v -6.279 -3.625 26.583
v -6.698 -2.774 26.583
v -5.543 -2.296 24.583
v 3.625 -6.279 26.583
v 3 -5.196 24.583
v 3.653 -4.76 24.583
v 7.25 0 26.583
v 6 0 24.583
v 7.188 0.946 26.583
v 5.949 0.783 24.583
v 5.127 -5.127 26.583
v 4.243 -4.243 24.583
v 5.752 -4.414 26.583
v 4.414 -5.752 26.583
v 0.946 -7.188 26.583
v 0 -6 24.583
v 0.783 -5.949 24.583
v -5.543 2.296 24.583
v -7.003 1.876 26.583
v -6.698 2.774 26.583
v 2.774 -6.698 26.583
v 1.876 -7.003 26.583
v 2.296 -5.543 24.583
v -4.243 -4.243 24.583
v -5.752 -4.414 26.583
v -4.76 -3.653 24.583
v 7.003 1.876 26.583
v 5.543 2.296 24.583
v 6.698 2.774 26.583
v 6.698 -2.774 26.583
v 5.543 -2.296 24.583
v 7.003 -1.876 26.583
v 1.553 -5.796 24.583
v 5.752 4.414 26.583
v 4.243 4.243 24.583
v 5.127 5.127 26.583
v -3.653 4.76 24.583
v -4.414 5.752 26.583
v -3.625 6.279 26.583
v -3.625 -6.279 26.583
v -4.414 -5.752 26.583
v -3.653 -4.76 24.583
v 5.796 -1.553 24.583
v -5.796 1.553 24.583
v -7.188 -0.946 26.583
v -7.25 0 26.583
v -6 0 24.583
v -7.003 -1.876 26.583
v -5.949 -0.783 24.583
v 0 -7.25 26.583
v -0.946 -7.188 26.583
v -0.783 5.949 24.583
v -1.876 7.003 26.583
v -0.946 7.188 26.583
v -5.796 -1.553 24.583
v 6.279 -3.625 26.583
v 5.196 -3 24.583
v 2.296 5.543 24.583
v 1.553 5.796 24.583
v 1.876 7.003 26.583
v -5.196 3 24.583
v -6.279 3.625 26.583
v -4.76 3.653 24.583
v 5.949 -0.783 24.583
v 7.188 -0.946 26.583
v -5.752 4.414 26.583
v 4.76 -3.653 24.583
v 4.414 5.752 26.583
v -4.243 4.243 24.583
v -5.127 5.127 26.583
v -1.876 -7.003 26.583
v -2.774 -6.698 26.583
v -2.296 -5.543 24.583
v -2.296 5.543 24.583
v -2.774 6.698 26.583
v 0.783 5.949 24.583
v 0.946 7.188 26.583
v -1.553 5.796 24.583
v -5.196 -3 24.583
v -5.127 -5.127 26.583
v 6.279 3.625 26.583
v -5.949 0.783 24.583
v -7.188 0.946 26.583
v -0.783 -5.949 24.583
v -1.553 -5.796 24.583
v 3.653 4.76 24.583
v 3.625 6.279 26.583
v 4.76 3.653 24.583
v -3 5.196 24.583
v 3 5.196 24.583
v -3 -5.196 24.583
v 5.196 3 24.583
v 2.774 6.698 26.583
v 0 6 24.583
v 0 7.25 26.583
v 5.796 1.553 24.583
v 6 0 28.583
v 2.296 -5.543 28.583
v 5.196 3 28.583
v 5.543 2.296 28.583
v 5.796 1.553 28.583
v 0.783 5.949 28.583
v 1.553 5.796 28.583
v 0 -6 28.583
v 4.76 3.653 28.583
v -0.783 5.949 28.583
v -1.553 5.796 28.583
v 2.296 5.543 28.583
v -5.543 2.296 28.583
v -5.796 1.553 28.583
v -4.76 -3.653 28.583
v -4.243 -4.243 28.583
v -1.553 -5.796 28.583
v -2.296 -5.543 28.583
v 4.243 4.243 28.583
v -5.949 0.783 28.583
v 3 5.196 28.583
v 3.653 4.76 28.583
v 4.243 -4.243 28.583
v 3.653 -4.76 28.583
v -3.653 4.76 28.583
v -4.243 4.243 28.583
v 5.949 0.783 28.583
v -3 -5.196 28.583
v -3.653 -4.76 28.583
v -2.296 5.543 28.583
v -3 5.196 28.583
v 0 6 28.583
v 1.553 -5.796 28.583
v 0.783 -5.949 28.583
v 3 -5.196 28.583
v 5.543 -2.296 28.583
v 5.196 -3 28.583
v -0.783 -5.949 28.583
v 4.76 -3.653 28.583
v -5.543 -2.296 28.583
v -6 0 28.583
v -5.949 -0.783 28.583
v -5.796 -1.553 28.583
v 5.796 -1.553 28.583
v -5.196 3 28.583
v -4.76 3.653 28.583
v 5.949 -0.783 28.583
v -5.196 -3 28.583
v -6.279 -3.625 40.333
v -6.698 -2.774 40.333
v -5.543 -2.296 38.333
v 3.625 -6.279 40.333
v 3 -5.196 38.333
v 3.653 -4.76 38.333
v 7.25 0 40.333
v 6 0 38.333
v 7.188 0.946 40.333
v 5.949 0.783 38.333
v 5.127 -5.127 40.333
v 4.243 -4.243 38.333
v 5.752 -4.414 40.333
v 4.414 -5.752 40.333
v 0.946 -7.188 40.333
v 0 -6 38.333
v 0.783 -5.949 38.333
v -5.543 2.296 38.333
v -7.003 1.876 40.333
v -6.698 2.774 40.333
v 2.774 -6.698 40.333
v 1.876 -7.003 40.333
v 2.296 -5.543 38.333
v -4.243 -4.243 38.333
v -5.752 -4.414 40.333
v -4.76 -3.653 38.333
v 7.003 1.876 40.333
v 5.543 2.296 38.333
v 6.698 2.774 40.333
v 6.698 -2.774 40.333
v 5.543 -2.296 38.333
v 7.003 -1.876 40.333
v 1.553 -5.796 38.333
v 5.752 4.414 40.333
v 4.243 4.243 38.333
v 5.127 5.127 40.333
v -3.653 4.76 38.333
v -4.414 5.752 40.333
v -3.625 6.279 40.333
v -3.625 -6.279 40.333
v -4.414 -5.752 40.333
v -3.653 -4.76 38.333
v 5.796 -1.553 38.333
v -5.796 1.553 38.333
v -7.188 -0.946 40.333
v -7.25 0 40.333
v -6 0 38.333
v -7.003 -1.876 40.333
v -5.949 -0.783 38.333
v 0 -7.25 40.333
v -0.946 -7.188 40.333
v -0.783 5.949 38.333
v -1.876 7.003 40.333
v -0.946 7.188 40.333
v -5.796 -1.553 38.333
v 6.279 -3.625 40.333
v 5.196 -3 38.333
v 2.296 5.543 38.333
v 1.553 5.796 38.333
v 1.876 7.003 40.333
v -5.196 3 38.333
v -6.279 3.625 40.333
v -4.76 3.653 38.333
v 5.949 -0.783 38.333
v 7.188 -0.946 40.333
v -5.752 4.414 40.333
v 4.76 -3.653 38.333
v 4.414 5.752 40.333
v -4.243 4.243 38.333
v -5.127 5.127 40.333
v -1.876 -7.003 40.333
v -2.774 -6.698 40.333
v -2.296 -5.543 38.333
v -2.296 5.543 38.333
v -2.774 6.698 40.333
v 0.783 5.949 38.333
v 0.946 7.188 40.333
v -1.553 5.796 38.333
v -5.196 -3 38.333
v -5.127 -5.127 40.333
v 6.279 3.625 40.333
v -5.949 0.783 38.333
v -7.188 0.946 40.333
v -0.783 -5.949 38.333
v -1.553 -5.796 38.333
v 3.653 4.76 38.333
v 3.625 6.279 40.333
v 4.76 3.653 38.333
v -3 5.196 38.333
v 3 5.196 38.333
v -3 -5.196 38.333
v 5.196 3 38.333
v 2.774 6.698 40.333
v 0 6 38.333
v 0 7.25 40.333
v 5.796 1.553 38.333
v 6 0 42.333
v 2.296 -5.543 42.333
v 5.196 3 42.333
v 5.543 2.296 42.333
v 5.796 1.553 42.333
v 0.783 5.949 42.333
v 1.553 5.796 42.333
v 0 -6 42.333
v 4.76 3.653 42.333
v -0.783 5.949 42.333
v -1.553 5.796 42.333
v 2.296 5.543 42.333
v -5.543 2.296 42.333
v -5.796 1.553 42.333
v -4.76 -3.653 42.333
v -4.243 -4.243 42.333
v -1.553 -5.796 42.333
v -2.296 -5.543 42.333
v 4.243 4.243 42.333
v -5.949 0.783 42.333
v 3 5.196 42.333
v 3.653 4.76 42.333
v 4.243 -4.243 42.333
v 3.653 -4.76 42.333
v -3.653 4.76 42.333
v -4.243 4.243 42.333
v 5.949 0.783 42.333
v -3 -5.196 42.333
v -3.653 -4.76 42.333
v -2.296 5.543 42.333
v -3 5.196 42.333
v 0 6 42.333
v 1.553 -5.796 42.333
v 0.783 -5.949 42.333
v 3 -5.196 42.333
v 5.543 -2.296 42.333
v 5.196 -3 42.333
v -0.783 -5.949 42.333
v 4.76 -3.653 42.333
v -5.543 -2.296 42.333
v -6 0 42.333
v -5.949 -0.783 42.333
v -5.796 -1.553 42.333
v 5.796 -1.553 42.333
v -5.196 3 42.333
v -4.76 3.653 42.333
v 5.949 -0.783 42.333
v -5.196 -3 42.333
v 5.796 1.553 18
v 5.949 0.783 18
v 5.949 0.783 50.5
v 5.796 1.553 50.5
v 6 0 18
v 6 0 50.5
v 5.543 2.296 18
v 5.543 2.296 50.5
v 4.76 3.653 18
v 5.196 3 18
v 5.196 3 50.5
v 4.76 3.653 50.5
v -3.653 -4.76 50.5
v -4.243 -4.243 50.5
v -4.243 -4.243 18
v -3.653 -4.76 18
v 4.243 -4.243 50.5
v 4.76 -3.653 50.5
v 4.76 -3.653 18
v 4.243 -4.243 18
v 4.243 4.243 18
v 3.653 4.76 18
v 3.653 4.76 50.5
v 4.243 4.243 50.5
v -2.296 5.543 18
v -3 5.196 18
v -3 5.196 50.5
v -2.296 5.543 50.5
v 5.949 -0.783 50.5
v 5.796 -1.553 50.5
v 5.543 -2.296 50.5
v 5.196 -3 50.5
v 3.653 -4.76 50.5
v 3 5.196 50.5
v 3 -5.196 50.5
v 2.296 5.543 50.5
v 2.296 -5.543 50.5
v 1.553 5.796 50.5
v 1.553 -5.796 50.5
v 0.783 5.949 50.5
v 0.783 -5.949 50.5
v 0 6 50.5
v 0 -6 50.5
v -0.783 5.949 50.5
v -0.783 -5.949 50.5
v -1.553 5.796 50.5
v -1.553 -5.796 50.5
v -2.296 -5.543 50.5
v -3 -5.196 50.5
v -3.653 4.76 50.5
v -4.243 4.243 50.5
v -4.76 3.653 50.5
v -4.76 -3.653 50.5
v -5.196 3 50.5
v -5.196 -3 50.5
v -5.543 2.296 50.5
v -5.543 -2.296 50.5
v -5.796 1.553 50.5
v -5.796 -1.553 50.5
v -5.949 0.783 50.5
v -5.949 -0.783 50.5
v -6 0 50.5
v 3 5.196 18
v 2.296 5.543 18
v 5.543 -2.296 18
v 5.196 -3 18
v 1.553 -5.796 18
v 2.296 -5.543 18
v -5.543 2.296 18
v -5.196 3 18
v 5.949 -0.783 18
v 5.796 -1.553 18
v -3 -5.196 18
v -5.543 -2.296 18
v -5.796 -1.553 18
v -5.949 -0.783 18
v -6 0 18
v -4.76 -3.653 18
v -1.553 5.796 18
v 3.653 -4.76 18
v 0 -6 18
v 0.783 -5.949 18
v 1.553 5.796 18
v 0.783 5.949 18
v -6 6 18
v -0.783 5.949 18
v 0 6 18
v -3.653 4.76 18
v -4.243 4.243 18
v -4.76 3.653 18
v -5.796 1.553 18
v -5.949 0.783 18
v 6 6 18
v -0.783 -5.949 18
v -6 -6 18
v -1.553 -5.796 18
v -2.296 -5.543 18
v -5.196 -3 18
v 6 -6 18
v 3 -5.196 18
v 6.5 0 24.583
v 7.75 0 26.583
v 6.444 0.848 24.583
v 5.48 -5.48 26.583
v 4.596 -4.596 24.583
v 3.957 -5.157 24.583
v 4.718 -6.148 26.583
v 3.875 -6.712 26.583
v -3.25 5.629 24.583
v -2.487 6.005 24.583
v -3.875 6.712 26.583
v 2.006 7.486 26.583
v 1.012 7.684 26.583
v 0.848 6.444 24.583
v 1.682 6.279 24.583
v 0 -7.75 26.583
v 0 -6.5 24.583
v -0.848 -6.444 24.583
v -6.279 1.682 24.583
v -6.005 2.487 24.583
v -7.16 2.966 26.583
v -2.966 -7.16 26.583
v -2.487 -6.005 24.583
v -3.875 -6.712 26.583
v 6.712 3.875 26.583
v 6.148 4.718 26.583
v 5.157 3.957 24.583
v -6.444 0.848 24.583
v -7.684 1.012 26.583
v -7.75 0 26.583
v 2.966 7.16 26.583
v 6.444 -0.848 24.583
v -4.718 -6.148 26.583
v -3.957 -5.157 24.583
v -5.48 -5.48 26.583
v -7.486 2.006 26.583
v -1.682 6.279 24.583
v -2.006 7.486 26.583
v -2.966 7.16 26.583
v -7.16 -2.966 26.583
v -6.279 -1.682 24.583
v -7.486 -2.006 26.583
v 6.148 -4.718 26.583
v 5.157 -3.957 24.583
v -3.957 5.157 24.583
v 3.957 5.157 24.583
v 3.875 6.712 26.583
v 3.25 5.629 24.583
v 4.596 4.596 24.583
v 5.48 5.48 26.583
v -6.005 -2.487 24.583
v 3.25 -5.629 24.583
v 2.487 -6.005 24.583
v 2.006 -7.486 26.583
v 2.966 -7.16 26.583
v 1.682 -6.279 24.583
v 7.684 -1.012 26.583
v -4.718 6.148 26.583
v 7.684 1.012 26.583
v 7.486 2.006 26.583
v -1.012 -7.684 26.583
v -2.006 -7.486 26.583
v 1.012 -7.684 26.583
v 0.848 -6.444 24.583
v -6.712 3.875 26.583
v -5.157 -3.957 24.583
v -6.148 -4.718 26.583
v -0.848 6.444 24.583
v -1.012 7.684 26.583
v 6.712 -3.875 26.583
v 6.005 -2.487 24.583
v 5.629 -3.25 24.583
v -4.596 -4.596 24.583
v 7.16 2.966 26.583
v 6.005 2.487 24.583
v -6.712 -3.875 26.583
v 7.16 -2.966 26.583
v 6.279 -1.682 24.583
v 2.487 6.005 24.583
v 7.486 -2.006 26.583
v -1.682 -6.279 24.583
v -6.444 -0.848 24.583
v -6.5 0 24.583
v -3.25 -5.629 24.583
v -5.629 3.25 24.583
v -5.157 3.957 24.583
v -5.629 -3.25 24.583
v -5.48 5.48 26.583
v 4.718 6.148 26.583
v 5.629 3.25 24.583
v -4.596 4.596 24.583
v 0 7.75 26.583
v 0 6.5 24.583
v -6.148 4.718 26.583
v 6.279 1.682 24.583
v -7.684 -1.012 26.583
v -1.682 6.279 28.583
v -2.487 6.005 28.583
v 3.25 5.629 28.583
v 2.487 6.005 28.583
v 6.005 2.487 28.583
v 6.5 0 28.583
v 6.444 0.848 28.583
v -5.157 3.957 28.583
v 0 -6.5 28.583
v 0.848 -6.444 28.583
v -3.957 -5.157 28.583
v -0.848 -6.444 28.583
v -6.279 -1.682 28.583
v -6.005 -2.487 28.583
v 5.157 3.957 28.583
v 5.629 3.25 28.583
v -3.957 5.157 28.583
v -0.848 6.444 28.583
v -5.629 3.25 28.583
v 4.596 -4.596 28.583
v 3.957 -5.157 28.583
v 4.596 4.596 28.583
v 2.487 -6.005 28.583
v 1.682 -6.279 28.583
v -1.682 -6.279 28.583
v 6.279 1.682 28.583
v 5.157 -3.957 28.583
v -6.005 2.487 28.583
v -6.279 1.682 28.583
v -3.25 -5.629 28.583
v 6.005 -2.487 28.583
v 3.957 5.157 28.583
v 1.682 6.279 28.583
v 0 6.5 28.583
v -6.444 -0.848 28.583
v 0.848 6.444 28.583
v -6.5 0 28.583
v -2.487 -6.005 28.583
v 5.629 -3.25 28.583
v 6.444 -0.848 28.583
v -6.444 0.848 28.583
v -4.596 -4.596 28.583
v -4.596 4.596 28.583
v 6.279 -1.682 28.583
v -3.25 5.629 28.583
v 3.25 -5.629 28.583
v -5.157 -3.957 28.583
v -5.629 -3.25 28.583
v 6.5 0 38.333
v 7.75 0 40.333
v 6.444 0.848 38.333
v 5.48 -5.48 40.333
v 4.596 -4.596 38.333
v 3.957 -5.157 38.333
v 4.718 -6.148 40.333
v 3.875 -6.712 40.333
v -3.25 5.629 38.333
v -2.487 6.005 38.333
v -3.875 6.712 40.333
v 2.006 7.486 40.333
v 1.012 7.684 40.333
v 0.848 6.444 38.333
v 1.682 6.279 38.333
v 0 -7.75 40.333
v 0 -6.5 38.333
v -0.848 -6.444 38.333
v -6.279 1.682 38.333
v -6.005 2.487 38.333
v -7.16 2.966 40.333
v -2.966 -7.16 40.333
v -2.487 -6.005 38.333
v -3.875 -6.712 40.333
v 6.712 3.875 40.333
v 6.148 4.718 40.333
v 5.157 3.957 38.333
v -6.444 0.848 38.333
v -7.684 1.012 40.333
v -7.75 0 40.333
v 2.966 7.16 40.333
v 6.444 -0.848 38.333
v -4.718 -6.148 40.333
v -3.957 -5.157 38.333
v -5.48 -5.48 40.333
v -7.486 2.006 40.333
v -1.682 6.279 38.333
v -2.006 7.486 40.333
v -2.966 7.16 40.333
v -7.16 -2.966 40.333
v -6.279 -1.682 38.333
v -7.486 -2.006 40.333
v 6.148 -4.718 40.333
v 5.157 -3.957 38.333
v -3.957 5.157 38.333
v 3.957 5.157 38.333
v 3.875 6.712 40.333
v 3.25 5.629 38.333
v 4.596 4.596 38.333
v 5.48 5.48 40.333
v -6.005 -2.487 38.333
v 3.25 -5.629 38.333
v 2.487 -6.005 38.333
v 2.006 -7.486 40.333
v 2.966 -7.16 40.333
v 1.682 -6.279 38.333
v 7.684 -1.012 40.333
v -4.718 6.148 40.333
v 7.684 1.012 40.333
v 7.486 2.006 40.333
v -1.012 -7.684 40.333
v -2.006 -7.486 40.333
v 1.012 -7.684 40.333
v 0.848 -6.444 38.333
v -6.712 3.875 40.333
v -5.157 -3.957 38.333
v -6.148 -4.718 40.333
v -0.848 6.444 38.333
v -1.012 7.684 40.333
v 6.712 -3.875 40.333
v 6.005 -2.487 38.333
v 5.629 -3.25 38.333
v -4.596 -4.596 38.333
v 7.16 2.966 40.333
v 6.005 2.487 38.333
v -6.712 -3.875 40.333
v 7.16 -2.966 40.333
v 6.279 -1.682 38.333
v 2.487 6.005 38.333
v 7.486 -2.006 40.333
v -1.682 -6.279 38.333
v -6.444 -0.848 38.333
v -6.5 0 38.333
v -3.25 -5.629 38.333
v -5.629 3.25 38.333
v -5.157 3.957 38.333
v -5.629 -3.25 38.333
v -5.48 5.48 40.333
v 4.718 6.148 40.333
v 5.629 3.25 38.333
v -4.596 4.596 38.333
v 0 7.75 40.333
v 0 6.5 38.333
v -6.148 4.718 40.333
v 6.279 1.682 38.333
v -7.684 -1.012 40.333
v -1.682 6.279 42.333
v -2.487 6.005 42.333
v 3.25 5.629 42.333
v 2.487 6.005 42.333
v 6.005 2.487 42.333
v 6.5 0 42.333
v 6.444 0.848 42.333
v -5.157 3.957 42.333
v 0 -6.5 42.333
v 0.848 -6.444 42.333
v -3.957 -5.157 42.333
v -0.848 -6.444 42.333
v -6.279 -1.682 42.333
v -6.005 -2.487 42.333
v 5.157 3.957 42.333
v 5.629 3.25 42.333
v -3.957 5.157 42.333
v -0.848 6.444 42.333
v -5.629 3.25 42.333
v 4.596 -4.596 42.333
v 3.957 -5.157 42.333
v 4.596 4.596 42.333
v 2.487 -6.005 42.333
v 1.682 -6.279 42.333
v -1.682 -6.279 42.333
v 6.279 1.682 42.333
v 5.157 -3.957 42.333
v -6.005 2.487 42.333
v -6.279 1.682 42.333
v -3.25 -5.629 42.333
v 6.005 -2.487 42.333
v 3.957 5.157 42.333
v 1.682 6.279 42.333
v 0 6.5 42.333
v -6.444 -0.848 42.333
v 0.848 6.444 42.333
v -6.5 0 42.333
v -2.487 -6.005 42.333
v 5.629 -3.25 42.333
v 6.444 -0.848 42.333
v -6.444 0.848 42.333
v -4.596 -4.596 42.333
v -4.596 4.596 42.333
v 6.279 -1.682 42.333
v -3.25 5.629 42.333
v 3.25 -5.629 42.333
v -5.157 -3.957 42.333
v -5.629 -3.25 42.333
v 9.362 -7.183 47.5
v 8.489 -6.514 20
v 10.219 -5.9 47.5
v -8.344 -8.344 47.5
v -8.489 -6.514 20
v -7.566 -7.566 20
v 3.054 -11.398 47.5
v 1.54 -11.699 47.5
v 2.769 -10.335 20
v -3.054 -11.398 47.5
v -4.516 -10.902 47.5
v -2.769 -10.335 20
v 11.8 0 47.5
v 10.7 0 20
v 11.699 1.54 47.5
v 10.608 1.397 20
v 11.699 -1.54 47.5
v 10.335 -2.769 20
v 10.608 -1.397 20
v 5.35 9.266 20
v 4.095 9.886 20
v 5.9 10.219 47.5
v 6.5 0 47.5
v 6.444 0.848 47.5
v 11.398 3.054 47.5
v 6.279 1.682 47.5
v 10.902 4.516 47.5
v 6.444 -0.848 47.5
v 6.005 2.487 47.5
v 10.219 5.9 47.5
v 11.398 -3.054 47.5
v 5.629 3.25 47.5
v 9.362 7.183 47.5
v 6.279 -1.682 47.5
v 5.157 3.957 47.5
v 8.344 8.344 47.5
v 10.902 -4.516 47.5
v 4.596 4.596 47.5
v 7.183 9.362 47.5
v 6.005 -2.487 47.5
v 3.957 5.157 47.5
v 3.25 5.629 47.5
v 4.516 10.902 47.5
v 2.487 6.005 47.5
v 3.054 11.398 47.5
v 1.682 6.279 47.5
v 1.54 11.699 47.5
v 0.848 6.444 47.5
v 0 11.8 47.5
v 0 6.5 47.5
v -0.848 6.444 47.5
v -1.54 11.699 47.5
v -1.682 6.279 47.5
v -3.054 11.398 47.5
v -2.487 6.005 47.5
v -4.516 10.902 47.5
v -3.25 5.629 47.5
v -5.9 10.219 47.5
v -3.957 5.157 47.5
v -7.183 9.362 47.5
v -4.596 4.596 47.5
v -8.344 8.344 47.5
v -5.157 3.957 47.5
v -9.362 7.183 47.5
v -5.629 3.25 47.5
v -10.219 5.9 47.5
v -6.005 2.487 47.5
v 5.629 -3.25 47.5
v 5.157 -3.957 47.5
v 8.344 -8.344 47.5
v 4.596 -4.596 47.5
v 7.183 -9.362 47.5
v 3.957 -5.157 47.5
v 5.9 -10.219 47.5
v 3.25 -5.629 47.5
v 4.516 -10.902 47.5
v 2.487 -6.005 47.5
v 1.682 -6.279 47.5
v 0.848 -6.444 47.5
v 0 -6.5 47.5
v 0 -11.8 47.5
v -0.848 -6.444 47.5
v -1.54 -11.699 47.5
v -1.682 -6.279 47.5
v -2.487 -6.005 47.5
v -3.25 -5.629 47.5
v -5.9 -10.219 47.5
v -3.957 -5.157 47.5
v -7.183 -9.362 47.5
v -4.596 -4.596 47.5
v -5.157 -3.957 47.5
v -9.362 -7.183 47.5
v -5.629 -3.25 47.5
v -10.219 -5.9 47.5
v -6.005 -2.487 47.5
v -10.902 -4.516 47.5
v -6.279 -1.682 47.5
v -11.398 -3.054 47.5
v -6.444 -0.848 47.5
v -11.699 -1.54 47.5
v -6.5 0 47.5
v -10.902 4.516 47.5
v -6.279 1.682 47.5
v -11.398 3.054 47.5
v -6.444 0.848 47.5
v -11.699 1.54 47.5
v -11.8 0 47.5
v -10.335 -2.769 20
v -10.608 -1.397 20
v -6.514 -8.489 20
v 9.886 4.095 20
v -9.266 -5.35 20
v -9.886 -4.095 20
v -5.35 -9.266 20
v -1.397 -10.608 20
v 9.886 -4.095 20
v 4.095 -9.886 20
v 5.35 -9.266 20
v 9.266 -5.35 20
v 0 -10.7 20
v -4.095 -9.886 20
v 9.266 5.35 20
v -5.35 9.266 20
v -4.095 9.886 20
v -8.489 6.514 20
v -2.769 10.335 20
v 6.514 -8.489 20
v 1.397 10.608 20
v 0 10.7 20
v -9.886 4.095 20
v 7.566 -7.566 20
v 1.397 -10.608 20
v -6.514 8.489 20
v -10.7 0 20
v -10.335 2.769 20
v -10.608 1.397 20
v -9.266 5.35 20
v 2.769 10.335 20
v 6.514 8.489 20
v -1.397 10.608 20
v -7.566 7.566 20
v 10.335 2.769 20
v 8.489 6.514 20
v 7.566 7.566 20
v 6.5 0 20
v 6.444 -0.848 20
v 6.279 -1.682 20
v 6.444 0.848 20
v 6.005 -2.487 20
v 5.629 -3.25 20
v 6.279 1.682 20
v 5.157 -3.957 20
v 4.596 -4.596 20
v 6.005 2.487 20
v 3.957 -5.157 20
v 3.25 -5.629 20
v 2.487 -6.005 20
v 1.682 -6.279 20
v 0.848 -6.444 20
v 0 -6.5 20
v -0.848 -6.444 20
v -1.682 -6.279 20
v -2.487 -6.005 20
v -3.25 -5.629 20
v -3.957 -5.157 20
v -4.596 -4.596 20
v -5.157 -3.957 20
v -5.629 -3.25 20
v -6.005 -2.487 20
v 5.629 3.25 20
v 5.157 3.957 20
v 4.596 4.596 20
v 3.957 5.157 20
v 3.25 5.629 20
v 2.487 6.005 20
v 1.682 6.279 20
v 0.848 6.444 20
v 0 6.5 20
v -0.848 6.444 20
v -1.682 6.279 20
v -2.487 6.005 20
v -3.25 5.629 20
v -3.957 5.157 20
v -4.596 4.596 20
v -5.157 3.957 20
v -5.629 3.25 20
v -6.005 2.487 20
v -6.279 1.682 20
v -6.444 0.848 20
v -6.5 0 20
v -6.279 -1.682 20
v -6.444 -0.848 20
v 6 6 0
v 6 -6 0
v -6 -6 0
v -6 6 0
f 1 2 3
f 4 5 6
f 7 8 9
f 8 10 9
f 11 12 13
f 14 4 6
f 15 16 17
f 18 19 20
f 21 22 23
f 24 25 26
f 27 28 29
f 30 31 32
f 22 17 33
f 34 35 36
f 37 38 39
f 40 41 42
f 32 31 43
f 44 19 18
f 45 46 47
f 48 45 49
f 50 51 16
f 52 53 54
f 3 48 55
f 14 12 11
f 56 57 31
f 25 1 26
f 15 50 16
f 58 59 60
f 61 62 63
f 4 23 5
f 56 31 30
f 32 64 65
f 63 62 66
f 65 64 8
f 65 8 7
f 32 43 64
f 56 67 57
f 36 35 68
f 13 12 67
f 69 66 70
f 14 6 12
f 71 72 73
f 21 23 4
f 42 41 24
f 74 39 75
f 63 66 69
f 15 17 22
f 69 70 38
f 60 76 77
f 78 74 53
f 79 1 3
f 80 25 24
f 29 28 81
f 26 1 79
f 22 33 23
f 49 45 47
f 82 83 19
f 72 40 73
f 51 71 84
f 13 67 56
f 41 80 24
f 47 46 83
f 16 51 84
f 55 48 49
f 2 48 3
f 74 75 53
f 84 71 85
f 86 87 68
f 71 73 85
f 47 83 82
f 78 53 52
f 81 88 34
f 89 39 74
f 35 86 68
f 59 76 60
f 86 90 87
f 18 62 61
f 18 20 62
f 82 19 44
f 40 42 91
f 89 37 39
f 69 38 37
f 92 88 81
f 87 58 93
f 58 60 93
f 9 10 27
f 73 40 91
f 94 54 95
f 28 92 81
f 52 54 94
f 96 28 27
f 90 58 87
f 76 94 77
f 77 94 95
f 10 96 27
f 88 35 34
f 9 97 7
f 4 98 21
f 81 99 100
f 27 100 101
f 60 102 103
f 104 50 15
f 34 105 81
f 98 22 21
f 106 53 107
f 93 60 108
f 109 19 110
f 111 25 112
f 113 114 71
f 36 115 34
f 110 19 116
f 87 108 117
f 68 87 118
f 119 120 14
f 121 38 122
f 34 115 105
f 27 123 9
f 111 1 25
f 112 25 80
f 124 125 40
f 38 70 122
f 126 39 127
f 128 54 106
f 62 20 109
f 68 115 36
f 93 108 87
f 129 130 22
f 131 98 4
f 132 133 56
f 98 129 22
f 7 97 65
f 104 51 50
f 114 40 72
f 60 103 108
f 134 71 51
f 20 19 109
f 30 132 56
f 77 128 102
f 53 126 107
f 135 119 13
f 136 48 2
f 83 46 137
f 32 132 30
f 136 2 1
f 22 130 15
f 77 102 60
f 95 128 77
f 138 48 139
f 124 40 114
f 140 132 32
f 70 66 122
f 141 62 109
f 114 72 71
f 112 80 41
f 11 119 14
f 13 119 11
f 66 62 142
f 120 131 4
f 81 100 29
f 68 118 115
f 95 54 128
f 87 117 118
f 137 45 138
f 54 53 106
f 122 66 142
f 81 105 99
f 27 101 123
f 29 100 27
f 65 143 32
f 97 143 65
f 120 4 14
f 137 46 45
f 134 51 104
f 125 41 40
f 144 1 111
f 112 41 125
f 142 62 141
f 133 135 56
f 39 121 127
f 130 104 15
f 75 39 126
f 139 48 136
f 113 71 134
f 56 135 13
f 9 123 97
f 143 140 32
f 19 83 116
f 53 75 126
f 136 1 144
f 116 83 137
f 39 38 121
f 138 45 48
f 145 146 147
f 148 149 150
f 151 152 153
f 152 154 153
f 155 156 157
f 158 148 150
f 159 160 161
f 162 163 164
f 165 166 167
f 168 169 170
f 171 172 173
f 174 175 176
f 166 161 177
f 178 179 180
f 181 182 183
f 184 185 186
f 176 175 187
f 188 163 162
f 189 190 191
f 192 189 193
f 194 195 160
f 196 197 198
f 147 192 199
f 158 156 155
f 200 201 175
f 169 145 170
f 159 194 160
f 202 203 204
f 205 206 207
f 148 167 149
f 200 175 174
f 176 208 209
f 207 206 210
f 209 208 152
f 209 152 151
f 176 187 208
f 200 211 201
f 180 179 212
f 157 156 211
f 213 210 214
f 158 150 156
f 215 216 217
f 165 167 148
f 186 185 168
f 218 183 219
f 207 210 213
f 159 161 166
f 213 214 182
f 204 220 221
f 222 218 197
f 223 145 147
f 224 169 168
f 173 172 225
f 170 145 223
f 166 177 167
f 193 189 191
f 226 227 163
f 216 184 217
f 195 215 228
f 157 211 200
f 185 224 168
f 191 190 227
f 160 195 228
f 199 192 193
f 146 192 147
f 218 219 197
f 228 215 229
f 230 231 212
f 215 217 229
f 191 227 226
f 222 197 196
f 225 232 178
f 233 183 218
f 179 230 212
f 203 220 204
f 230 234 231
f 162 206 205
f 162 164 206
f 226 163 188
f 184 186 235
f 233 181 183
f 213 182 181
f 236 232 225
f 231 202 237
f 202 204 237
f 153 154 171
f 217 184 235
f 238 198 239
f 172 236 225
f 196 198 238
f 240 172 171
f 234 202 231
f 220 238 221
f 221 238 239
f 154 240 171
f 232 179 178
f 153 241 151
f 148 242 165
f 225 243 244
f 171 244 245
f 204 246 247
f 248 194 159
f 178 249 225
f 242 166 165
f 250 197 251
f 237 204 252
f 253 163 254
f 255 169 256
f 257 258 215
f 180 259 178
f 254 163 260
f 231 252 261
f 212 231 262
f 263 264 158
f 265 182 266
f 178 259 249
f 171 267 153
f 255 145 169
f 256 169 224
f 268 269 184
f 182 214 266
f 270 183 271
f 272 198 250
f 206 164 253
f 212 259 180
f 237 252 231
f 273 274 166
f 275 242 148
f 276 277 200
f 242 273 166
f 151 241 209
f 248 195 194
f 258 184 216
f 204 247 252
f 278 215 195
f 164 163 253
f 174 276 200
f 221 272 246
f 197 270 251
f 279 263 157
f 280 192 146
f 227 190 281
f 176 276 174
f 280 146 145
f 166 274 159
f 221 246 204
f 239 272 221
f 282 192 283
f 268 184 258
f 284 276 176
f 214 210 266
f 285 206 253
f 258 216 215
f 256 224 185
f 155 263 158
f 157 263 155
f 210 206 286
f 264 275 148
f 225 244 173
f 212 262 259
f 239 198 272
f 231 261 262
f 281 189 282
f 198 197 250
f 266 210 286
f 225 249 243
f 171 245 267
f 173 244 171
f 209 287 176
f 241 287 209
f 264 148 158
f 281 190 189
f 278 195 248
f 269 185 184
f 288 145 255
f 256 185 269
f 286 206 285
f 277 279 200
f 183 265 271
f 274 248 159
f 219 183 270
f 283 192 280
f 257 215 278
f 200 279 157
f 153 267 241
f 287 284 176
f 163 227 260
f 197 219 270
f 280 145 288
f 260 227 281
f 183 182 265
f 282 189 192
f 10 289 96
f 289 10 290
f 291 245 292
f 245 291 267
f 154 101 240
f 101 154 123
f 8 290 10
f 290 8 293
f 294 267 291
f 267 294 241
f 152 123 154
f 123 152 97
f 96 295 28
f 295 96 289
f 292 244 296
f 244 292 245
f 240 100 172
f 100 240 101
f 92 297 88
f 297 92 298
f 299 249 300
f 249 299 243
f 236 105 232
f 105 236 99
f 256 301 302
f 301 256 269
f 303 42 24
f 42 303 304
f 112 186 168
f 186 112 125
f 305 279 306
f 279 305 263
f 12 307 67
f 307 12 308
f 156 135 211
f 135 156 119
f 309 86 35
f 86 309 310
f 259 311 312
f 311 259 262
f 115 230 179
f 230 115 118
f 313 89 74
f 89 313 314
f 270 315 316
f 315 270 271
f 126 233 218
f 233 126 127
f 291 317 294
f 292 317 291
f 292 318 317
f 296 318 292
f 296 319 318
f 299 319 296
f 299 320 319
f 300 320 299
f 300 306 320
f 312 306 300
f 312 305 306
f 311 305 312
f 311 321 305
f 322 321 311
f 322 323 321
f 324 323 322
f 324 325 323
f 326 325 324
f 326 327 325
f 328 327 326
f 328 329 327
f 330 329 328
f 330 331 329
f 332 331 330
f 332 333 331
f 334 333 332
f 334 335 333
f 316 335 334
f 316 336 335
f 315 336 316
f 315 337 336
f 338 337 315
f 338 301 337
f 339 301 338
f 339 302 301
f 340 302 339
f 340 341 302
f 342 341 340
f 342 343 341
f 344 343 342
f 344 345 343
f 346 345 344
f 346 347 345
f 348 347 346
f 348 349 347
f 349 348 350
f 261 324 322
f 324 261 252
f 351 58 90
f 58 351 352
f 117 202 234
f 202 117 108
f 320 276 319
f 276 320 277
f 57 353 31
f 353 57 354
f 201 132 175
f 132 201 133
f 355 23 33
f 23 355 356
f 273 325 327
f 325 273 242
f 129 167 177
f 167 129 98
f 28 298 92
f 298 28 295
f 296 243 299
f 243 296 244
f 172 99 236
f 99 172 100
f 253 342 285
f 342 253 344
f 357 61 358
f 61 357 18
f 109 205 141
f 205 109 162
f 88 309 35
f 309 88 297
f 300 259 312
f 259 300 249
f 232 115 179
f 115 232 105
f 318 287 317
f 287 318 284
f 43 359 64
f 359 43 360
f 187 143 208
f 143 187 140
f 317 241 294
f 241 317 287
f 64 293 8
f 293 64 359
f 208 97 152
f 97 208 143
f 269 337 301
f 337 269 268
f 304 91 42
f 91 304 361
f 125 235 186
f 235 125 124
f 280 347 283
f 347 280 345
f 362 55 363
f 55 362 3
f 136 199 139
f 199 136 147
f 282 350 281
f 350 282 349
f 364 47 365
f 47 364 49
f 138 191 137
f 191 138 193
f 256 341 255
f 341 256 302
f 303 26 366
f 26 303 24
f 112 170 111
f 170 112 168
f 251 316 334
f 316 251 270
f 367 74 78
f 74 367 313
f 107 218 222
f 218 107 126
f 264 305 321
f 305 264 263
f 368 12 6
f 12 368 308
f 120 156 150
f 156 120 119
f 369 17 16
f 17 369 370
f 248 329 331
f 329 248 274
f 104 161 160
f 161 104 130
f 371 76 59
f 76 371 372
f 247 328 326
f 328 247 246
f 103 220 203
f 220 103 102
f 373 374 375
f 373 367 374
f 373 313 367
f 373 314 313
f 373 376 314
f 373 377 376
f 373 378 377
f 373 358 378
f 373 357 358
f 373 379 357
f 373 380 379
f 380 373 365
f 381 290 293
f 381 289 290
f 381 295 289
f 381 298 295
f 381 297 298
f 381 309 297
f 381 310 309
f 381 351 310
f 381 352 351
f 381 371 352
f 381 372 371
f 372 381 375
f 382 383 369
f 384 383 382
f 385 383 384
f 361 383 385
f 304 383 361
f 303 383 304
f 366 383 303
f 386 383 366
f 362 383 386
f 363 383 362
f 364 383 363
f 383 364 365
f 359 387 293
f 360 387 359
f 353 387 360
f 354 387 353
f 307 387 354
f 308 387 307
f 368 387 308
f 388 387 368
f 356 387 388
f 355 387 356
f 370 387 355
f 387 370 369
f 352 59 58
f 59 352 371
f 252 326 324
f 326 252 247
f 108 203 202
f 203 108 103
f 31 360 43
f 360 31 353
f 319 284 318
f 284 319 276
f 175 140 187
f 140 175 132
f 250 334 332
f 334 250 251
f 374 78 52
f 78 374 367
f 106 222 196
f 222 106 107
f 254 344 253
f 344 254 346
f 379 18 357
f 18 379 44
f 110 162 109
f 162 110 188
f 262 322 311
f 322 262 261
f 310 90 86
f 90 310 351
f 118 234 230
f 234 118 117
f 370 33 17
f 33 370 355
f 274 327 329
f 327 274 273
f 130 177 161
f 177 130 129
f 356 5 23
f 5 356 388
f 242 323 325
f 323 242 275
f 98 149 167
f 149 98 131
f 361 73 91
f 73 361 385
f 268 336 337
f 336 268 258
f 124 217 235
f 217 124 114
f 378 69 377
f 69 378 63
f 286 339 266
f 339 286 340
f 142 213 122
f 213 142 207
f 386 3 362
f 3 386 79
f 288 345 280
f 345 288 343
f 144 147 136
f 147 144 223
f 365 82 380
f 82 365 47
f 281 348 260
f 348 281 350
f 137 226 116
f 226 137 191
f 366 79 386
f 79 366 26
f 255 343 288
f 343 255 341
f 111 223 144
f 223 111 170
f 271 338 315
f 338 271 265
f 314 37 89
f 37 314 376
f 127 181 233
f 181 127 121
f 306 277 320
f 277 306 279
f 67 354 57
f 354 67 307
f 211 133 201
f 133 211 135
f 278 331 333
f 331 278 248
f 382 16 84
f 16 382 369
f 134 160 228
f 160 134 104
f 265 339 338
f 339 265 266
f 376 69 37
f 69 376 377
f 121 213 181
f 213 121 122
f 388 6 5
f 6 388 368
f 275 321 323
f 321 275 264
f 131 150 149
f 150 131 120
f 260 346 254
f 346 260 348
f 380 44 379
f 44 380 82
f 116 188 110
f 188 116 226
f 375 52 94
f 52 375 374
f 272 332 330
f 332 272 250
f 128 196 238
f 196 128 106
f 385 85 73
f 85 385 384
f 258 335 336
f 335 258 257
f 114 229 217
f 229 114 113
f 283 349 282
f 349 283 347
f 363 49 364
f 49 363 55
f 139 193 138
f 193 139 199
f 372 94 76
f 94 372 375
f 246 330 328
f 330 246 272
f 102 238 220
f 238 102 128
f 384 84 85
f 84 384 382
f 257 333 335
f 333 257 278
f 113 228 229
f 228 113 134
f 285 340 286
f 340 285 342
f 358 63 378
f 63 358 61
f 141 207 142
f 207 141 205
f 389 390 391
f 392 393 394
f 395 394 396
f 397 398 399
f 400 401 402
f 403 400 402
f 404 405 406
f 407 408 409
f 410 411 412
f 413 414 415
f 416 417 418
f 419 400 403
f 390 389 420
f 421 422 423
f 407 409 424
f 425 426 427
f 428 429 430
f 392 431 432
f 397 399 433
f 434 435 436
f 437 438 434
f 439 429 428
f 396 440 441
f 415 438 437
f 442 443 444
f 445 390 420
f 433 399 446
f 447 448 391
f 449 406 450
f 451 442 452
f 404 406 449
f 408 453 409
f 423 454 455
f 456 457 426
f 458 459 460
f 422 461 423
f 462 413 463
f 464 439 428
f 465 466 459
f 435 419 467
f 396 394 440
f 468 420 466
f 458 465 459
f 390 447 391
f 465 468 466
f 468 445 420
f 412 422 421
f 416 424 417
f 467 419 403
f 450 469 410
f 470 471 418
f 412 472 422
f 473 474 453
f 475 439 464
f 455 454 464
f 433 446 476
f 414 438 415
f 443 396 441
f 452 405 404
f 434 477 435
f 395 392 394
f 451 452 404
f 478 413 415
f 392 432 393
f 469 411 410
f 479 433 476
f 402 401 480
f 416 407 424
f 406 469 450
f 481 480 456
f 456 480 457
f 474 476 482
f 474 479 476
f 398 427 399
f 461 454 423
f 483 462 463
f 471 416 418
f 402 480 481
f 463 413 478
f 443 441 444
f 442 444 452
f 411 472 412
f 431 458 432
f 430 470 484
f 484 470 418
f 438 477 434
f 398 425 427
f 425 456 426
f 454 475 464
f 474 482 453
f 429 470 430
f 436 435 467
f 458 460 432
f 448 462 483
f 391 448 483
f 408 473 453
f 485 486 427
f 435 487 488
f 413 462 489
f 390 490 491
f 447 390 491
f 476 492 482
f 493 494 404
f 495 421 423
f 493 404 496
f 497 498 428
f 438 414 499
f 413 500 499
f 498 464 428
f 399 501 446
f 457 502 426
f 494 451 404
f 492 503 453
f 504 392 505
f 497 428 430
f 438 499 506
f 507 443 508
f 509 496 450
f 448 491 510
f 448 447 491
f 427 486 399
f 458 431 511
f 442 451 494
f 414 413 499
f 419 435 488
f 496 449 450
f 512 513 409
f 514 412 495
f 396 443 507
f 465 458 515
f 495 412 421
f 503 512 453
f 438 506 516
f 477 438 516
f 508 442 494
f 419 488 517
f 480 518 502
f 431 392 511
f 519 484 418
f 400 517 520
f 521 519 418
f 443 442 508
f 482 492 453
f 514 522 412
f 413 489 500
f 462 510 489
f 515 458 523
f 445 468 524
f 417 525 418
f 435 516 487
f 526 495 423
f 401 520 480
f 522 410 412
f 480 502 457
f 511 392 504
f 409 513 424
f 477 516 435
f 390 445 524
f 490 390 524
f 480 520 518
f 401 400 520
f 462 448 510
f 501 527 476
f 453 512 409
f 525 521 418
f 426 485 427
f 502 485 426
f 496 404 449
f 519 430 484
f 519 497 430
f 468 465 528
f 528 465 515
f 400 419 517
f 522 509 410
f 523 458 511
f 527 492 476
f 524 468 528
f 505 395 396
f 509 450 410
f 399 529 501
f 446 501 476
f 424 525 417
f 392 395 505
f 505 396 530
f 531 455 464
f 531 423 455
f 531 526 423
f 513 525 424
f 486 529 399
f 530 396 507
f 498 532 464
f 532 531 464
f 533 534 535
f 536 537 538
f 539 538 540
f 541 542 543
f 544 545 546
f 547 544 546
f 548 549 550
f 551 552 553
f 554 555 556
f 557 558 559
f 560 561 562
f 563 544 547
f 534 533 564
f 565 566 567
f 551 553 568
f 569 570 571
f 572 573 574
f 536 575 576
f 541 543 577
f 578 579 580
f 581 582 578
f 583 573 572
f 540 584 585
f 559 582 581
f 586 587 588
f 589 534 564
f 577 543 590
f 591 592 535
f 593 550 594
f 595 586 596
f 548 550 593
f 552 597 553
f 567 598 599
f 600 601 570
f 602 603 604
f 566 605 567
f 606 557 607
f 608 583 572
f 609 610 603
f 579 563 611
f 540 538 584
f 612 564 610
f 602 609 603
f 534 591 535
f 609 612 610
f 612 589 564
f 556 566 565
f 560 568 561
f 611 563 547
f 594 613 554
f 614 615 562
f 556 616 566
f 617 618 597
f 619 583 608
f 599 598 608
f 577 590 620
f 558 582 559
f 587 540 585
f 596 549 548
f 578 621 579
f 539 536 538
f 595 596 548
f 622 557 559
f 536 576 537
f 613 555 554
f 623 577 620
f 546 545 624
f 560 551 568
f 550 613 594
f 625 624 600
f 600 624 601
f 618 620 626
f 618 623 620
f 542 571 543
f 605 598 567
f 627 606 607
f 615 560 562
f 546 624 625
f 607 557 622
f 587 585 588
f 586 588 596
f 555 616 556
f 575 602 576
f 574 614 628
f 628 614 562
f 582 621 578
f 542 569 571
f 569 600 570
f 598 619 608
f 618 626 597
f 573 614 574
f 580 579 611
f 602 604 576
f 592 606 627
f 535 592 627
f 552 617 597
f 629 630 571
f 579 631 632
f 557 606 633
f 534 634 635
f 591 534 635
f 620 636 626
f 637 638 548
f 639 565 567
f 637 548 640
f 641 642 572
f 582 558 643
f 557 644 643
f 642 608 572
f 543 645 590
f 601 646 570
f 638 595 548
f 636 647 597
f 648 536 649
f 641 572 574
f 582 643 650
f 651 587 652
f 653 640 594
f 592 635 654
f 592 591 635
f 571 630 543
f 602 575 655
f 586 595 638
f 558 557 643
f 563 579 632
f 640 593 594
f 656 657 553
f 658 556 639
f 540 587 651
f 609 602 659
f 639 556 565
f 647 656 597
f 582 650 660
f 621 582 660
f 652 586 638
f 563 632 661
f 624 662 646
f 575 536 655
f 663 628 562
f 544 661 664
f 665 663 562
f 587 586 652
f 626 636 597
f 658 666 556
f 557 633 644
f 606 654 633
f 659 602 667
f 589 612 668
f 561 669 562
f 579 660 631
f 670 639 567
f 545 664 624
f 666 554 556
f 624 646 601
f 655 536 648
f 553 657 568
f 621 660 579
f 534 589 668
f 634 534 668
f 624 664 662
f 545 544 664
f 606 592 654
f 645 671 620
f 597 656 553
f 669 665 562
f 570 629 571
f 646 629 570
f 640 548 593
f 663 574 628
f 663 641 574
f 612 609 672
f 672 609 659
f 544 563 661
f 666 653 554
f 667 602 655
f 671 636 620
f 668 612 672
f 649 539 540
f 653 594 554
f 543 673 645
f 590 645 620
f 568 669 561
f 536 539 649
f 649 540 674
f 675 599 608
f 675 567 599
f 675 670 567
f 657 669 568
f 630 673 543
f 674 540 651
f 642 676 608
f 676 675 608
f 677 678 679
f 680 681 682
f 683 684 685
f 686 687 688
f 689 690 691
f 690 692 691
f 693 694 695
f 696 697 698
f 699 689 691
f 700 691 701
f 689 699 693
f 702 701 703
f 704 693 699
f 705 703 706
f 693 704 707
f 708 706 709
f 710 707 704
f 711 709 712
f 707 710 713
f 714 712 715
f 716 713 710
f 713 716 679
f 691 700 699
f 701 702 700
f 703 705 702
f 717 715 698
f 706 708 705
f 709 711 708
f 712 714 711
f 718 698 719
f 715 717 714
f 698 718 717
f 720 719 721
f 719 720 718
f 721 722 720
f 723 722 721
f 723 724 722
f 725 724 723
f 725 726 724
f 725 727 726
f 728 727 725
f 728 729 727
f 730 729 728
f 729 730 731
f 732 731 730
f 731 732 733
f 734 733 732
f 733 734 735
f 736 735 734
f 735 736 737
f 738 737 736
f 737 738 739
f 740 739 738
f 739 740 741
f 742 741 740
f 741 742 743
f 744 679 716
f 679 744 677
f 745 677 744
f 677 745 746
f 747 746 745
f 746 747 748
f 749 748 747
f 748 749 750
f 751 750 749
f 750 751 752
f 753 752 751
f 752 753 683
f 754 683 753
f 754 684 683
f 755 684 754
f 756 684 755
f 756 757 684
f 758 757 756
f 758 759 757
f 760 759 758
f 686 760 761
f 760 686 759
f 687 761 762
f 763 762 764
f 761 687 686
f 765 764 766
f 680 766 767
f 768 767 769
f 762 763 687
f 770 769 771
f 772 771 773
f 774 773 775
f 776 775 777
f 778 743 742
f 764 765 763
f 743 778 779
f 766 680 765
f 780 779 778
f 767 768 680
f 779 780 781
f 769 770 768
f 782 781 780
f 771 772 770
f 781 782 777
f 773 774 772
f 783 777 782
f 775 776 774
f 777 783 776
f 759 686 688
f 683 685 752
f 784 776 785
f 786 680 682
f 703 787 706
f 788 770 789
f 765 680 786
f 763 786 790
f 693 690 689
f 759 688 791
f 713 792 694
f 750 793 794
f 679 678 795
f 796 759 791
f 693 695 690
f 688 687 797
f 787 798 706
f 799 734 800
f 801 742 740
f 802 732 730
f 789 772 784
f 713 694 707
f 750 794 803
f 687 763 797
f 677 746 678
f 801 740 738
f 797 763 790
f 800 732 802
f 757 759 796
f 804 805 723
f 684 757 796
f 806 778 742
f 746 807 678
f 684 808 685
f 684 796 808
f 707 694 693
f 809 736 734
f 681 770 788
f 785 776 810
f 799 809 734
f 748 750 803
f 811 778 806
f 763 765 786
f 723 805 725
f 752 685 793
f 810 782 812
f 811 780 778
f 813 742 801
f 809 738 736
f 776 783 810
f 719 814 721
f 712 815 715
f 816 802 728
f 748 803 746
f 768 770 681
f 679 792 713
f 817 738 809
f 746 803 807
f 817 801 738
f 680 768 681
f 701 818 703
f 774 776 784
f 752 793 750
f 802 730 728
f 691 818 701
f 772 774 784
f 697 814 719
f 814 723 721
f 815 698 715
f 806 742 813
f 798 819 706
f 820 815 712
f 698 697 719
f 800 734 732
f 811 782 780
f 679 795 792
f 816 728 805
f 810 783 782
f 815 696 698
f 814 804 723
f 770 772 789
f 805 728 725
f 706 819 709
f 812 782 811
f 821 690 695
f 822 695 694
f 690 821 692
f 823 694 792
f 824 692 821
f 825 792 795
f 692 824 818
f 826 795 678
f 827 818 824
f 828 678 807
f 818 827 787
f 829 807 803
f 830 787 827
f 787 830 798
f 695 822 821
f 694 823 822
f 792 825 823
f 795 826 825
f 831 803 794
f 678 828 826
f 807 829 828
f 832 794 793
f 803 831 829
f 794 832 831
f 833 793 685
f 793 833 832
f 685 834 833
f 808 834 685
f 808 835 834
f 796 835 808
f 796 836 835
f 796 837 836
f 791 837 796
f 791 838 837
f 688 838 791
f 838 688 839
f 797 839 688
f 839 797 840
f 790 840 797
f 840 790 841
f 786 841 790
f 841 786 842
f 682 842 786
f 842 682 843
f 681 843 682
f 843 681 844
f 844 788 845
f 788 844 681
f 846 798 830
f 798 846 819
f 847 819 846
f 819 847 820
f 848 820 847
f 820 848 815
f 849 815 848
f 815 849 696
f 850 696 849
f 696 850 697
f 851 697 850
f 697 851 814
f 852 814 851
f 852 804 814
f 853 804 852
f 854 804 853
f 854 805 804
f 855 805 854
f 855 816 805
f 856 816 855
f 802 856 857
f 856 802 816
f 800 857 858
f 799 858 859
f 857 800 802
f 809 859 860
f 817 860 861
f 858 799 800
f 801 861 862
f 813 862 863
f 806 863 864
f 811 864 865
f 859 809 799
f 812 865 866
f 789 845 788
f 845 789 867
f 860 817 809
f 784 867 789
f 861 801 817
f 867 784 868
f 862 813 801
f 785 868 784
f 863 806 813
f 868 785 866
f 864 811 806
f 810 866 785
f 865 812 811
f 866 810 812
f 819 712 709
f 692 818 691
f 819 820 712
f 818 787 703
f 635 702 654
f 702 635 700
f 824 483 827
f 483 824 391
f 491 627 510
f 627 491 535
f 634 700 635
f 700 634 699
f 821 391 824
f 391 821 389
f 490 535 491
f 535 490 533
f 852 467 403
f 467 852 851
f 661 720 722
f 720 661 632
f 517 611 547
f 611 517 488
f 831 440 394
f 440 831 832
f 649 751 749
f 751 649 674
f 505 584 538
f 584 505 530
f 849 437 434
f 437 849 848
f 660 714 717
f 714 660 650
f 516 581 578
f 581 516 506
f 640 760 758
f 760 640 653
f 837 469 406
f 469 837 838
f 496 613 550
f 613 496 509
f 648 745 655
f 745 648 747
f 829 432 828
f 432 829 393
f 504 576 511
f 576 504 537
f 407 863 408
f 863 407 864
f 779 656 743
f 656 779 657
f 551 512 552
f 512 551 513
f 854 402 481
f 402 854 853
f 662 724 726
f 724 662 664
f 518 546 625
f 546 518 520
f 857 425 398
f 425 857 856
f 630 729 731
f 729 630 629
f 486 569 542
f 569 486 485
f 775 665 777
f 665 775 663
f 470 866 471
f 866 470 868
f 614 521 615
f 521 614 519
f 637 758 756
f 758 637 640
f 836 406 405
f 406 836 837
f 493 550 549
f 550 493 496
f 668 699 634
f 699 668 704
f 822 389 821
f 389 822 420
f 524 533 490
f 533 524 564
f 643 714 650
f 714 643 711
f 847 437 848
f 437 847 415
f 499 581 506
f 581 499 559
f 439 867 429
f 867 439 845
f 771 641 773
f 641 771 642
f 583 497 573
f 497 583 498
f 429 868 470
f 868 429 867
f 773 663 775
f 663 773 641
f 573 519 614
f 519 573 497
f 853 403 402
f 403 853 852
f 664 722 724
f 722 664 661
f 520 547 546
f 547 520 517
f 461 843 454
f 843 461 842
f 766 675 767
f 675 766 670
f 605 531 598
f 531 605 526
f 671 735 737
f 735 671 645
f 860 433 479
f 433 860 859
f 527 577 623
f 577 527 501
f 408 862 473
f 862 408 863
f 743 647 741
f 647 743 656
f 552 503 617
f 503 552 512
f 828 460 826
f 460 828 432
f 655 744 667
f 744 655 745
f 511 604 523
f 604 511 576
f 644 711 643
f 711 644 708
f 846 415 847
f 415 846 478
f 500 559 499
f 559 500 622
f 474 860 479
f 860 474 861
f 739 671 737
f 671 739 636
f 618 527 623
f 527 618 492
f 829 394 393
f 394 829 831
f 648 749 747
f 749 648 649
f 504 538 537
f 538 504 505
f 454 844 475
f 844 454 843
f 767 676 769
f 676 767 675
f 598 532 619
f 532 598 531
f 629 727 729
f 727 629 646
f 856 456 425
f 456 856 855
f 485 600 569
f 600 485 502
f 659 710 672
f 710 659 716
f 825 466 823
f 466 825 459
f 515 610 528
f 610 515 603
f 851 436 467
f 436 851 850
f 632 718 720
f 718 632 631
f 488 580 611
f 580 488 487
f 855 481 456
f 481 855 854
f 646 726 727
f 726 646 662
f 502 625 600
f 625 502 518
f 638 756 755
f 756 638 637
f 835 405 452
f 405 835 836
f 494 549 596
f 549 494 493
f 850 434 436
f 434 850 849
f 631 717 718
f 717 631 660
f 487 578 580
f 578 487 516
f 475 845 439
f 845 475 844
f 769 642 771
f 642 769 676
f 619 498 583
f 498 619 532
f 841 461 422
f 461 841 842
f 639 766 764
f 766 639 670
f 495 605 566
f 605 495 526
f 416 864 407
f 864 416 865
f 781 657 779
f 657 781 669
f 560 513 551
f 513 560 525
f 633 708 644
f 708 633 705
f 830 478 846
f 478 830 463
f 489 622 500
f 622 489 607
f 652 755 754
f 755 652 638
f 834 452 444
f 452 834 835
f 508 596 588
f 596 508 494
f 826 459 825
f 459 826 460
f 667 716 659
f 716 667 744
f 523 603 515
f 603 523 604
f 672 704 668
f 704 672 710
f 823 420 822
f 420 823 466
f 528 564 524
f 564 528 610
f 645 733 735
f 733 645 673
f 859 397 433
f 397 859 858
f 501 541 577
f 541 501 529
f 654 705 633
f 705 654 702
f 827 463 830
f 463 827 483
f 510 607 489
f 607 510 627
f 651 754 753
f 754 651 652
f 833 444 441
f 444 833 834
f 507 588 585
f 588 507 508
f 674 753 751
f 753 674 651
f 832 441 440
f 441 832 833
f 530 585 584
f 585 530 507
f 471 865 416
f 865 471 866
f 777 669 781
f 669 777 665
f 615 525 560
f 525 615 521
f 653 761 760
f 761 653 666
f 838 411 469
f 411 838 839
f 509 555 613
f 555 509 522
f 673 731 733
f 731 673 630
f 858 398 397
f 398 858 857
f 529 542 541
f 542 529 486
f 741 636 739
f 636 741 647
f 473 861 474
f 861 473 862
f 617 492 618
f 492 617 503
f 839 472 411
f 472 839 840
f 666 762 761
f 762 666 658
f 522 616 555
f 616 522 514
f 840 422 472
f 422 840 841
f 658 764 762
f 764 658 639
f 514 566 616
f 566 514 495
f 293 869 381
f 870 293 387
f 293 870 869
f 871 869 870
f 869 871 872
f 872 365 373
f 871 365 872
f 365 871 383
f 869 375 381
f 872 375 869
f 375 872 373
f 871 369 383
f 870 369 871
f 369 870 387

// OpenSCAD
$fn = 48;

// length of the side of the connector that slots into the kitchenaid motor port
connector_side = 12;
max_connector_length = 20;

// diameter of the shaft that you can attach things to!
shaft_diameter = 12;

// separates the sleeve from the connector by shortening the connector. helps to not fuse them together
sleeve_separation = 2;
// top outer diameter of the sleeve. sleeve is the outer section that the kitchenaid screws into that doesn't rotate
sleeve_top_d = 23.6;
// top inner diameter of the sleeve
sleeve_bottom_d = 21.4;
// how long the sleeve is
sleeve_length = 27.5;


// how much space there is between the shaft and sleeve. must be smaller than pip_height
slop = 1;
// pips help lock the sleeve and connector in place to each other
pip_height = 2.5;

// virtual vars
total_height = max_connector_length + sleeve_length;
connector_length = max_connector_length - sleeve_separation;
half_shaft = connector_length / 2;
pip_position_one = sleeve_length / 6;
pip_position_two = 4 * sleeve_length / 6;
sleeve_id = shaft_diameter + slop;

// the rectangular prism that connects into the kitchenaid port
module connector() {
  translate([0,0,half_shaft]) cube([connector_side,connector_side,connector_length], center= true);
}

// the shaft, which attaches to the motor coupling and rotates
module shaft(extra_height = 0) {
  cylinder(d=shaft_diameter, h=sleeve_length+sleeve_separation+3);
   /* hull() {
    cube([connector_side + extra_diameter, connector_side + extra_diameter, 0.001], center=true);
    translate([0,0,sleeve_length]) cylinder(d=shaft_diameter + extra_diameter, h=0.001);
  } */
  translate([0,0,extra_height]) pips(shaft_diameter);
}

module pips(diameter) {
  translate([0,0,pip_position_one]) pip_band(diameter);
  translate([0,0,pip_position_two]) pip_band(diameter);
}

// the sleeve, which attaches to the kitchenaid case, and does not rotate
module sleeve() {
    difference() {
      cylinder(d1=sleeve_bottom_d, d2=sleeve_top_d, h=sleeve_length);
      cylinder(d=sleeve_id, h=sleeve_length);
      pips(sleeve_id);
    }
}

// a small band that keeps the shaft in place via a cutout in the sleeve
module pip_band(starting_diameter, height=pip_height) {
  cylinder(d1=starting_diameter, d2 = starting_diameter + height, h = 2);
  translate([0,0,2]) cylinder(d1=starting_diameter + height, d2 = starting_diameter, h = 2);
}

difference() {
  union() {
    connector();
    translate([0,0,max_connector_length]){
      translate([0,0,-sleeve_separation]) {
        shaft(sleeve_separation);
      }
        sleeve();
    }
  }
  // to display cross section
  /* cube(1000); */
}
